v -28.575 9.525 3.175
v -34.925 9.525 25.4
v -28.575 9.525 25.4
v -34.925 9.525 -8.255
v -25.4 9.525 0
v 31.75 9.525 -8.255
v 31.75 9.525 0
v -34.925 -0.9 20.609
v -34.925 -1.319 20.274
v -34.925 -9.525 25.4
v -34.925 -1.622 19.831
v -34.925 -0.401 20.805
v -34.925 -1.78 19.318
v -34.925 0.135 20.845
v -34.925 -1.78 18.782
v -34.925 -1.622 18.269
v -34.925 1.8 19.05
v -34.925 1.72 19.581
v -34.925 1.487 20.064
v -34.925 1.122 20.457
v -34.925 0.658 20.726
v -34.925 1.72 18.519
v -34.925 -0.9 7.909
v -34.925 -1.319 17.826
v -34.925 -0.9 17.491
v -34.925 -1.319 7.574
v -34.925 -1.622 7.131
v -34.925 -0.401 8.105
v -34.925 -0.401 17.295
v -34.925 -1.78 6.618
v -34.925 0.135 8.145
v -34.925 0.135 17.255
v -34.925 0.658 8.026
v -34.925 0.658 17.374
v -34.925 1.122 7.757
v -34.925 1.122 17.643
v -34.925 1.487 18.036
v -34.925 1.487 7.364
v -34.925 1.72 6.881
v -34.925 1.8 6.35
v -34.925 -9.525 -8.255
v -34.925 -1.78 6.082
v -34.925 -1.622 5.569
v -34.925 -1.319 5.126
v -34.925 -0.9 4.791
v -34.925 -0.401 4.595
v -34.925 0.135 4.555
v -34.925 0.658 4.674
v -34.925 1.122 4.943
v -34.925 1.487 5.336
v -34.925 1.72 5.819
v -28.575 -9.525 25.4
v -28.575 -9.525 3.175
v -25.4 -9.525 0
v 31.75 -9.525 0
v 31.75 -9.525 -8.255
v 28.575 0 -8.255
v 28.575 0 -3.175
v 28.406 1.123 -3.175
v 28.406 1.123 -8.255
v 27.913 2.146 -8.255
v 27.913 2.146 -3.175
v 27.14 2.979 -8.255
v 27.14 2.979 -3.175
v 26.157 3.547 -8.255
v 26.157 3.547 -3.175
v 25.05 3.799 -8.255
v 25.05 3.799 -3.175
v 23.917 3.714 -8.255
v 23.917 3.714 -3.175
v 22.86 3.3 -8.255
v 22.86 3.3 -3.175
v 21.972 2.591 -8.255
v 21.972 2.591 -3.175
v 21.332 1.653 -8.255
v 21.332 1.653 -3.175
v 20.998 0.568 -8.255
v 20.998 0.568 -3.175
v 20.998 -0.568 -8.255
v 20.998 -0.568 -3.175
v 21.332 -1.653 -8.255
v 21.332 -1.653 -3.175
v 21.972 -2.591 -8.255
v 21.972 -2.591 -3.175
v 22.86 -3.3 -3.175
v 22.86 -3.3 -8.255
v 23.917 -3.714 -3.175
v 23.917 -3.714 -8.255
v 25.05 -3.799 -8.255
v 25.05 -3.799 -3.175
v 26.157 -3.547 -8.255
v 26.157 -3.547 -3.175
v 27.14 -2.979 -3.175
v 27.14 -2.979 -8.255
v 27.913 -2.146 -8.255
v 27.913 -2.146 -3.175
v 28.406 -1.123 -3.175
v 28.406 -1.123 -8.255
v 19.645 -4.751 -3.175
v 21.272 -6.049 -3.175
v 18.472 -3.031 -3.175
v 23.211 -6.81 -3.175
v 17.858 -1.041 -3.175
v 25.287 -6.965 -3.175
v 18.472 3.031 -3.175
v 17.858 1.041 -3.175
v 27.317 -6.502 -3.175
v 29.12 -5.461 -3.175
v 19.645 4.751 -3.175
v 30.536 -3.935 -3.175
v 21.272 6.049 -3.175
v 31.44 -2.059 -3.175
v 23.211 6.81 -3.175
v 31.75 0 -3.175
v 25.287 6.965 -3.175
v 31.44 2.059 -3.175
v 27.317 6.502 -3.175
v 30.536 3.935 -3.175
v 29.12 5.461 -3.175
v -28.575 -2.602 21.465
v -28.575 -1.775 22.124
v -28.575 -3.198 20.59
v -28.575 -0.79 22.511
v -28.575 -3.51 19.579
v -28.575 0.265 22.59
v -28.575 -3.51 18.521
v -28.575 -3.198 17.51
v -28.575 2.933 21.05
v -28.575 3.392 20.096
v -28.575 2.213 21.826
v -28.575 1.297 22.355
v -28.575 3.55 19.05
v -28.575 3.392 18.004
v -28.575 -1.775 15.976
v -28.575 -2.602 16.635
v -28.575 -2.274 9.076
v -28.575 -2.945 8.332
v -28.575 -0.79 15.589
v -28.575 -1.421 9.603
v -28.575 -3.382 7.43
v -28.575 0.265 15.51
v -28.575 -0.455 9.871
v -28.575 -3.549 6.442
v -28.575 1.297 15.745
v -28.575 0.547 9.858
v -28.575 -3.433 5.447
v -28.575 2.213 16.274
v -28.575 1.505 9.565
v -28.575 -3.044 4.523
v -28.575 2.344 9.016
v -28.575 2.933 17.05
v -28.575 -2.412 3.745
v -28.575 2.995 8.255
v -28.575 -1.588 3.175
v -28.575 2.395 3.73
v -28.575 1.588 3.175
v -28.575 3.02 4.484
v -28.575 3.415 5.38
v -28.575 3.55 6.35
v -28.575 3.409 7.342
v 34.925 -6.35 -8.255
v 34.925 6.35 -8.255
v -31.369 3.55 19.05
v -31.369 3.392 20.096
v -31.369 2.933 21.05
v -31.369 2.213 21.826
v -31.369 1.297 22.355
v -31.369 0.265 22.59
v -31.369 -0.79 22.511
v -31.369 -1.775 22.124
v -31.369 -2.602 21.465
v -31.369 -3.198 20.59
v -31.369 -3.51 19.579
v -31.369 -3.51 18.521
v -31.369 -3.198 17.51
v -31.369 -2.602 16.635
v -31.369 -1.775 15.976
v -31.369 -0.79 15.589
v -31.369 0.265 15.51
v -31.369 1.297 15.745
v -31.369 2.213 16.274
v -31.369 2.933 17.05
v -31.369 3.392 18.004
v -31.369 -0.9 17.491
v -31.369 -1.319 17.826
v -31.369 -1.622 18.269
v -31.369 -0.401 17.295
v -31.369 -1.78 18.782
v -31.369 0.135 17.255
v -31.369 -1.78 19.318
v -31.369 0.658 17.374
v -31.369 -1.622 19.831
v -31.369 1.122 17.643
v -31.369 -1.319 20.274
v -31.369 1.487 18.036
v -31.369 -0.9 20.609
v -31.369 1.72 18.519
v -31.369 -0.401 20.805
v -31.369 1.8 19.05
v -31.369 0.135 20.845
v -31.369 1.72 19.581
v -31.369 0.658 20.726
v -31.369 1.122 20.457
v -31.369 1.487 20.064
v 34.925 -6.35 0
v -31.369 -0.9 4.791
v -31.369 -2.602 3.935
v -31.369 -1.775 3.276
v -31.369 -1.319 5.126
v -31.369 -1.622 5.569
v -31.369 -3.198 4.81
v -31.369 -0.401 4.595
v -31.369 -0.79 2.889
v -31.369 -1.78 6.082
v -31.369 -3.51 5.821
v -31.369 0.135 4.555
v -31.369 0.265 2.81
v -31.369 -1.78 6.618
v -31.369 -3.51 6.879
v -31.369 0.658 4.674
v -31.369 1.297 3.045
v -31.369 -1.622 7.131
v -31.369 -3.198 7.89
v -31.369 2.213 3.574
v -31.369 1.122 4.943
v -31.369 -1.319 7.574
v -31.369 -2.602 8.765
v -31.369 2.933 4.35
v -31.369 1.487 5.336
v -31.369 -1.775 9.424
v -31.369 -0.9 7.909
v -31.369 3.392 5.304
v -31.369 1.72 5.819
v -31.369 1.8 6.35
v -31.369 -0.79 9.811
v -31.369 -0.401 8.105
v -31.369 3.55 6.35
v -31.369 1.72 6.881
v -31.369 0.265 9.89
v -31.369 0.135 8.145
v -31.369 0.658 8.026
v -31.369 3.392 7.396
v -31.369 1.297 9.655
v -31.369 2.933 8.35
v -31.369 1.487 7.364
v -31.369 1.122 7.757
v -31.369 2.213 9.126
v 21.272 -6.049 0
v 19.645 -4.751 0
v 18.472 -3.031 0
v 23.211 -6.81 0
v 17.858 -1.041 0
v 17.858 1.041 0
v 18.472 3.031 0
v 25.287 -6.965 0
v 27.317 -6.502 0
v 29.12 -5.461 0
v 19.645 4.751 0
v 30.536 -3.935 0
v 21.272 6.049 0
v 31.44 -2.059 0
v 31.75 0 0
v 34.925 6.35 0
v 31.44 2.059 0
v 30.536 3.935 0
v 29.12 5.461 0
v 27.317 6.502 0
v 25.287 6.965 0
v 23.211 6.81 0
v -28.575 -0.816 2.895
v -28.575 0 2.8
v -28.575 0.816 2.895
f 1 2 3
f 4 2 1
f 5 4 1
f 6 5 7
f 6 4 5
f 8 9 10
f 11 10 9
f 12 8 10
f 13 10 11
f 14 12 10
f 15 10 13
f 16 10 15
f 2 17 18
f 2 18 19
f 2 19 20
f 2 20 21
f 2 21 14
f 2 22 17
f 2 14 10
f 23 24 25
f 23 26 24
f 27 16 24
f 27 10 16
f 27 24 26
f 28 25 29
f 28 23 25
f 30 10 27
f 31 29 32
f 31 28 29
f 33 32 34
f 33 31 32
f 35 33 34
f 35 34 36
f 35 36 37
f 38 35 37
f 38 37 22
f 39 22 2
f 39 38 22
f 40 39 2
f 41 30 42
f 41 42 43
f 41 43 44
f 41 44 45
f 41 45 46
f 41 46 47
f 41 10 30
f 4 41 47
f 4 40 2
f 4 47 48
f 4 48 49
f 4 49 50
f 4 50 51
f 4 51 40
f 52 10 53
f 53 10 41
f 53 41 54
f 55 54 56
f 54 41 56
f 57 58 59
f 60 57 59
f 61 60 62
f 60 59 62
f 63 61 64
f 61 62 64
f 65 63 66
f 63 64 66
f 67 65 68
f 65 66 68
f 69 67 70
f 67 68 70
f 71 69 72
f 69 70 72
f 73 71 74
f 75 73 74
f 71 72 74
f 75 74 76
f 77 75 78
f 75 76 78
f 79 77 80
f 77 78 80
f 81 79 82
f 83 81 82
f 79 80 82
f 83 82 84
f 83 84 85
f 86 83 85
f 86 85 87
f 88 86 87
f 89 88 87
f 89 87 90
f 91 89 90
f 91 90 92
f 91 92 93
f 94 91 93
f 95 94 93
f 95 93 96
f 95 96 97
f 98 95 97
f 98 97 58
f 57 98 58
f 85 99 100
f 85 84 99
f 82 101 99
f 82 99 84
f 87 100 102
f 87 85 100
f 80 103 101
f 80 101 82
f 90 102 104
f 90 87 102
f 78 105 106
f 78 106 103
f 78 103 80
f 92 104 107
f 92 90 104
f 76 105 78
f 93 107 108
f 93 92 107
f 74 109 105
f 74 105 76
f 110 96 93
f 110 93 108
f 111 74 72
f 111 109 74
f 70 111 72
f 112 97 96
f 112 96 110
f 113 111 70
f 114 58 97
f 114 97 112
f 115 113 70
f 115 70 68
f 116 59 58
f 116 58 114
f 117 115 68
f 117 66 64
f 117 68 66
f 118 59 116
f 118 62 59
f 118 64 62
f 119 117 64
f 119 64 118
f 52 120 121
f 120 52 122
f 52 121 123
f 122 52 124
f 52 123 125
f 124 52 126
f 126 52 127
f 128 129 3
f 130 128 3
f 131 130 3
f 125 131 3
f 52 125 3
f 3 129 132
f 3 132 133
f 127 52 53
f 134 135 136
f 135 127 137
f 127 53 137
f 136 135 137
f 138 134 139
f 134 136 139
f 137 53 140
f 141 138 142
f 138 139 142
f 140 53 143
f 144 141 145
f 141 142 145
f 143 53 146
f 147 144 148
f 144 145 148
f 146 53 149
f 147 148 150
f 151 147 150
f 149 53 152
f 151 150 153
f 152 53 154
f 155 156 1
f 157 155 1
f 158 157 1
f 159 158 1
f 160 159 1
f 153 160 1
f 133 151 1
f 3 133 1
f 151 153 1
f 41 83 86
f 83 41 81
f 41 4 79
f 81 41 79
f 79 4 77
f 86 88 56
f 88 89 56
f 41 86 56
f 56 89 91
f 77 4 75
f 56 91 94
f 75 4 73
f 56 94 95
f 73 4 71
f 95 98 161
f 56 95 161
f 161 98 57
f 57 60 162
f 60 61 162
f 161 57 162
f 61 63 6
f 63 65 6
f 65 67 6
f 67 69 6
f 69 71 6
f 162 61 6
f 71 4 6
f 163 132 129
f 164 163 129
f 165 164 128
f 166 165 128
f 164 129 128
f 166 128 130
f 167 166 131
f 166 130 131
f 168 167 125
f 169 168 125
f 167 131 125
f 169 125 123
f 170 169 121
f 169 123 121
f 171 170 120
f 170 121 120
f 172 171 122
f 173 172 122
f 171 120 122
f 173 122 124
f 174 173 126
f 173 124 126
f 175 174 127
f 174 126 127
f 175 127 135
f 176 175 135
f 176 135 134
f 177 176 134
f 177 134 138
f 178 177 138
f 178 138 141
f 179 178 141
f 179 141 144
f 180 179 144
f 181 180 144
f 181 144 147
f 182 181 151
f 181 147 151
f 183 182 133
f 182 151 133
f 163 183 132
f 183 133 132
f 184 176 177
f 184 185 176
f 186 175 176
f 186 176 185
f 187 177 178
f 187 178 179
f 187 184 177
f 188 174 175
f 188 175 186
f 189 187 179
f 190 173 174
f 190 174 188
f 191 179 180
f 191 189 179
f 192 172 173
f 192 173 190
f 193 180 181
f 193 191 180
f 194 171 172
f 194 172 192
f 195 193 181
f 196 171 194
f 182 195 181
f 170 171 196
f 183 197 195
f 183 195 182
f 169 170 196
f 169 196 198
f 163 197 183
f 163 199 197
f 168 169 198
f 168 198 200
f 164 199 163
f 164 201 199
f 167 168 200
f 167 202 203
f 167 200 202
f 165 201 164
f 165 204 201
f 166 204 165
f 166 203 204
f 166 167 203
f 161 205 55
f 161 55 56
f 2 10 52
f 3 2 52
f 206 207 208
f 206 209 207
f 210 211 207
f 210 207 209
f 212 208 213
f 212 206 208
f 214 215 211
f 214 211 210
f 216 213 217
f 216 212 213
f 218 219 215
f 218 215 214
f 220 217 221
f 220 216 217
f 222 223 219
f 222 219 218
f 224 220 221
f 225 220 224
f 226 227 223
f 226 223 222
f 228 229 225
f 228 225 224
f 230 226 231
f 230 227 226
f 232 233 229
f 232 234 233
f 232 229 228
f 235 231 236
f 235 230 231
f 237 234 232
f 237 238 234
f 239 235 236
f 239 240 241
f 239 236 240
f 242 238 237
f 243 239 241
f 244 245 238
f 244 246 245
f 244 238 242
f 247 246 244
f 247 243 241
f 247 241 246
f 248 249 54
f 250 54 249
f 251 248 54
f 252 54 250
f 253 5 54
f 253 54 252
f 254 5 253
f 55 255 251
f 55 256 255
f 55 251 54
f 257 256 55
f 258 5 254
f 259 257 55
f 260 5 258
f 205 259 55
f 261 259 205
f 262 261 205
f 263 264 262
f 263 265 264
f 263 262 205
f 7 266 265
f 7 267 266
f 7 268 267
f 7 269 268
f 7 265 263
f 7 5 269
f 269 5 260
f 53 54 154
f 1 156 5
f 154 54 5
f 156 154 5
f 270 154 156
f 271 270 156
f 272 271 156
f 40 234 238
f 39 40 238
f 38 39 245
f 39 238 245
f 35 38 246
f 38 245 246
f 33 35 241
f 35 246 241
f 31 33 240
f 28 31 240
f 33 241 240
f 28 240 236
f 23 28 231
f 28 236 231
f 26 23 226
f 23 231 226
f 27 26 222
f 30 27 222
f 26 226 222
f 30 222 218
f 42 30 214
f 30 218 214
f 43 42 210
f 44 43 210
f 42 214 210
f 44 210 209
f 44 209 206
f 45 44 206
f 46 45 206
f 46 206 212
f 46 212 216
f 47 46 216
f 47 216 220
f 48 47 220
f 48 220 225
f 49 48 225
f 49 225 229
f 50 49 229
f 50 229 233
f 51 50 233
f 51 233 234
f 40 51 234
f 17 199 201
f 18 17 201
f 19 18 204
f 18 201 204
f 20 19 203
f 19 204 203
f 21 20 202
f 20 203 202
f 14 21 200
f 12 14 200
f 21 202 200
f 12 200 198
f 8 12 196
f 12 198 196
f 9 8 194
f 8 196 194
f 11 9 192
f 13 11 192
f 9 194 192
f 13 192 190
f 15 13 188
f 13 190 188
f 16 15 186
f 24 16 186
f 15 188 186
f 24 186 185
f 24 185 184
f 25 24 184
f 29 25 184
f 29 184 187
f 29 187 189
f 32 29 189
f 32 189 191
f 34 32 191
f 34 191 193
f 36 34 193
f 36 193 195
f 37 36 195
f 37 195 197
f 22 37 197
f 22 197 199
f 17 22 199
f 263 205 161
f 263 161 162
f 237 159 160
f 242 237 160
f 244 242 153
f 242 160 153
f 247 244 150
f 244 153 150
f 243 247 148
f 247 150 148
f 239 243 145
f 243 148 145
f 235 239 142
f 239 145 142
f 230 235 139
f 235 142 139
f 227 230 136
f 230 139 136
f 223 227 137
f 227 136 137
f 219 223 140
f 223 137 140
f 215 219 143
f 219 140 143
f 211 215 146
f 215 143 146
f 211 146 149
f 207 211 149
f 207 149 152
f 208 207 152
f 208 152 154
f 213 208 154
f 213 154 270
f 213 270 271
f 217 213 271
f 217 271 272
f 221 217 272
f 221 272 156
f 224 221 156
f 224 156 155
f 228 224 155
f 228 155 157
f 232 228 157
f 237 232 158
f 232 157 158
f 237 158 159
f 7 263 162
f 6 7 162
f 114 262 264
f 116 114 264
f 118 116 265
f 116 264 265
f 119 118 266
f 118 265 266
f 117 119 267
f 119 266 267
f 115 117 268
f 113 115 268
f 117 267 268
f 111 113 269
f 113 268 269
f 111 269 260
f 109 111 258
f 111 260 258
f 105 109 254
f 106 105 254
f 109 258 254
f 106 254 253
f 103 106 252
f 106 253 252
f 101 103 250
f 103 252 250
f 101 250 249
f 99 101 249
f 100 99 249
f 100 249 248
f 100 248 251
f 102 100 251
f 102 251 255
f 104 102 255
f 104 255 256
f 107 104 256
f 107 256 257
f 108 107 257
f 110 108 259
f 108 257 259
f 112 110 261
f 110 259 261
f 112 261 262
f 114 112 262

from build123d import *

# Parameters (mm, degrees)
F0_W     = 63.5
F0_H     = 19.05
F0_R     = 6.985
F0_W_2   = 6.35
F0_R_2   = 3.81
F1_DEPTH = 8.255
F2_DEPTH = 25.4
F3_DEPTH = 3.175
F4_R     = 1.8
F5_DEPTH = 6.35
F6_SIZE  = 3.175
F4_R_2   = 3.55
F7_DEPTH = 2.794


with BuildPart() as f1:
    # F0 (on Top) → F1 (new body)
    with BuildSketch(Plane.XY):
        with Locations((3.175, 0)):
            Rectangle(F0_W, F0_H)
        with Locations((24.765, 0)):
            Circle(F0_R, mode=Mode.SUBTRACT)
        with Locations((-31.75, 0)):
            Rectangle(F0_W_2, F0_H)
        with Locations((24.765, 0)):
            Circle(F0_R)
        with Locations((24.765, 0)):
            Circle(F0_R_2, mode=Mode.SUBTRACT)
    extrude(amount=-F1_DEPTH)

    # F0 (on Top) → F2 (join)
    with BuildSketch(Plane.XY):
        with Locations((-31.75, 0)):
            Rectangle(F0_W_2, F0_H)
    extrude(amount=F2_DEPTH)

    # F0 (on Top) → F3 (cut)
    with BuildSketch(Plane.XY):
        with Locations((24.765, 0)):
            Circle(F0_R)
        with Locations((24.765, 0)):
            Circle(F0_R_2, mode=Mode.SUBTRACT)
    extrude(amount=-F3_DEPTH, mode=Mode.SUBTRACT)

    # F4 (on face) → F5 (cut, through all)
    with BuildSketch(Plane.YZ.offset(-28.575)):
        with Locations((0, 6.35)):
            Circle(F4_R)
        with Locations((0, 19.05)):
            Circle(F4_R)
    extrude(amount=-F5_DEPTH, mode=Mode.SUBTRACT)

    # F6
    f6_edges = [f1.edges().sort_by_distance(p)[0] for p in [
        (-28.575, 0, 0),
        (34.925, 9.525, -4.1275),
        (34.925, -9.525, -4.1275),
    ]]
    chamfer(f6_edges, length=F6_SIZE)

    # F4 (on face) → F7 (cut)
    with BuildSketch(Plane.YZ.offset(-28.575)):
        with Locations((0, 6.35)):
            Circle(F4_R_2)
        with Locations((0, 6.35)):
            Circle(F4_R, mode=Mode.SUBTRACT)
        with Locations((0, 19.05)):
            Circle(F4_R_2)
        with Locations((0, 19.05)):
            Circle(F4_R, mode=Mode.SUBTRACT)
    extrude(amount=-F7_DEPTH, mode=Mode.SUBTRACT)


solid = f1.part
